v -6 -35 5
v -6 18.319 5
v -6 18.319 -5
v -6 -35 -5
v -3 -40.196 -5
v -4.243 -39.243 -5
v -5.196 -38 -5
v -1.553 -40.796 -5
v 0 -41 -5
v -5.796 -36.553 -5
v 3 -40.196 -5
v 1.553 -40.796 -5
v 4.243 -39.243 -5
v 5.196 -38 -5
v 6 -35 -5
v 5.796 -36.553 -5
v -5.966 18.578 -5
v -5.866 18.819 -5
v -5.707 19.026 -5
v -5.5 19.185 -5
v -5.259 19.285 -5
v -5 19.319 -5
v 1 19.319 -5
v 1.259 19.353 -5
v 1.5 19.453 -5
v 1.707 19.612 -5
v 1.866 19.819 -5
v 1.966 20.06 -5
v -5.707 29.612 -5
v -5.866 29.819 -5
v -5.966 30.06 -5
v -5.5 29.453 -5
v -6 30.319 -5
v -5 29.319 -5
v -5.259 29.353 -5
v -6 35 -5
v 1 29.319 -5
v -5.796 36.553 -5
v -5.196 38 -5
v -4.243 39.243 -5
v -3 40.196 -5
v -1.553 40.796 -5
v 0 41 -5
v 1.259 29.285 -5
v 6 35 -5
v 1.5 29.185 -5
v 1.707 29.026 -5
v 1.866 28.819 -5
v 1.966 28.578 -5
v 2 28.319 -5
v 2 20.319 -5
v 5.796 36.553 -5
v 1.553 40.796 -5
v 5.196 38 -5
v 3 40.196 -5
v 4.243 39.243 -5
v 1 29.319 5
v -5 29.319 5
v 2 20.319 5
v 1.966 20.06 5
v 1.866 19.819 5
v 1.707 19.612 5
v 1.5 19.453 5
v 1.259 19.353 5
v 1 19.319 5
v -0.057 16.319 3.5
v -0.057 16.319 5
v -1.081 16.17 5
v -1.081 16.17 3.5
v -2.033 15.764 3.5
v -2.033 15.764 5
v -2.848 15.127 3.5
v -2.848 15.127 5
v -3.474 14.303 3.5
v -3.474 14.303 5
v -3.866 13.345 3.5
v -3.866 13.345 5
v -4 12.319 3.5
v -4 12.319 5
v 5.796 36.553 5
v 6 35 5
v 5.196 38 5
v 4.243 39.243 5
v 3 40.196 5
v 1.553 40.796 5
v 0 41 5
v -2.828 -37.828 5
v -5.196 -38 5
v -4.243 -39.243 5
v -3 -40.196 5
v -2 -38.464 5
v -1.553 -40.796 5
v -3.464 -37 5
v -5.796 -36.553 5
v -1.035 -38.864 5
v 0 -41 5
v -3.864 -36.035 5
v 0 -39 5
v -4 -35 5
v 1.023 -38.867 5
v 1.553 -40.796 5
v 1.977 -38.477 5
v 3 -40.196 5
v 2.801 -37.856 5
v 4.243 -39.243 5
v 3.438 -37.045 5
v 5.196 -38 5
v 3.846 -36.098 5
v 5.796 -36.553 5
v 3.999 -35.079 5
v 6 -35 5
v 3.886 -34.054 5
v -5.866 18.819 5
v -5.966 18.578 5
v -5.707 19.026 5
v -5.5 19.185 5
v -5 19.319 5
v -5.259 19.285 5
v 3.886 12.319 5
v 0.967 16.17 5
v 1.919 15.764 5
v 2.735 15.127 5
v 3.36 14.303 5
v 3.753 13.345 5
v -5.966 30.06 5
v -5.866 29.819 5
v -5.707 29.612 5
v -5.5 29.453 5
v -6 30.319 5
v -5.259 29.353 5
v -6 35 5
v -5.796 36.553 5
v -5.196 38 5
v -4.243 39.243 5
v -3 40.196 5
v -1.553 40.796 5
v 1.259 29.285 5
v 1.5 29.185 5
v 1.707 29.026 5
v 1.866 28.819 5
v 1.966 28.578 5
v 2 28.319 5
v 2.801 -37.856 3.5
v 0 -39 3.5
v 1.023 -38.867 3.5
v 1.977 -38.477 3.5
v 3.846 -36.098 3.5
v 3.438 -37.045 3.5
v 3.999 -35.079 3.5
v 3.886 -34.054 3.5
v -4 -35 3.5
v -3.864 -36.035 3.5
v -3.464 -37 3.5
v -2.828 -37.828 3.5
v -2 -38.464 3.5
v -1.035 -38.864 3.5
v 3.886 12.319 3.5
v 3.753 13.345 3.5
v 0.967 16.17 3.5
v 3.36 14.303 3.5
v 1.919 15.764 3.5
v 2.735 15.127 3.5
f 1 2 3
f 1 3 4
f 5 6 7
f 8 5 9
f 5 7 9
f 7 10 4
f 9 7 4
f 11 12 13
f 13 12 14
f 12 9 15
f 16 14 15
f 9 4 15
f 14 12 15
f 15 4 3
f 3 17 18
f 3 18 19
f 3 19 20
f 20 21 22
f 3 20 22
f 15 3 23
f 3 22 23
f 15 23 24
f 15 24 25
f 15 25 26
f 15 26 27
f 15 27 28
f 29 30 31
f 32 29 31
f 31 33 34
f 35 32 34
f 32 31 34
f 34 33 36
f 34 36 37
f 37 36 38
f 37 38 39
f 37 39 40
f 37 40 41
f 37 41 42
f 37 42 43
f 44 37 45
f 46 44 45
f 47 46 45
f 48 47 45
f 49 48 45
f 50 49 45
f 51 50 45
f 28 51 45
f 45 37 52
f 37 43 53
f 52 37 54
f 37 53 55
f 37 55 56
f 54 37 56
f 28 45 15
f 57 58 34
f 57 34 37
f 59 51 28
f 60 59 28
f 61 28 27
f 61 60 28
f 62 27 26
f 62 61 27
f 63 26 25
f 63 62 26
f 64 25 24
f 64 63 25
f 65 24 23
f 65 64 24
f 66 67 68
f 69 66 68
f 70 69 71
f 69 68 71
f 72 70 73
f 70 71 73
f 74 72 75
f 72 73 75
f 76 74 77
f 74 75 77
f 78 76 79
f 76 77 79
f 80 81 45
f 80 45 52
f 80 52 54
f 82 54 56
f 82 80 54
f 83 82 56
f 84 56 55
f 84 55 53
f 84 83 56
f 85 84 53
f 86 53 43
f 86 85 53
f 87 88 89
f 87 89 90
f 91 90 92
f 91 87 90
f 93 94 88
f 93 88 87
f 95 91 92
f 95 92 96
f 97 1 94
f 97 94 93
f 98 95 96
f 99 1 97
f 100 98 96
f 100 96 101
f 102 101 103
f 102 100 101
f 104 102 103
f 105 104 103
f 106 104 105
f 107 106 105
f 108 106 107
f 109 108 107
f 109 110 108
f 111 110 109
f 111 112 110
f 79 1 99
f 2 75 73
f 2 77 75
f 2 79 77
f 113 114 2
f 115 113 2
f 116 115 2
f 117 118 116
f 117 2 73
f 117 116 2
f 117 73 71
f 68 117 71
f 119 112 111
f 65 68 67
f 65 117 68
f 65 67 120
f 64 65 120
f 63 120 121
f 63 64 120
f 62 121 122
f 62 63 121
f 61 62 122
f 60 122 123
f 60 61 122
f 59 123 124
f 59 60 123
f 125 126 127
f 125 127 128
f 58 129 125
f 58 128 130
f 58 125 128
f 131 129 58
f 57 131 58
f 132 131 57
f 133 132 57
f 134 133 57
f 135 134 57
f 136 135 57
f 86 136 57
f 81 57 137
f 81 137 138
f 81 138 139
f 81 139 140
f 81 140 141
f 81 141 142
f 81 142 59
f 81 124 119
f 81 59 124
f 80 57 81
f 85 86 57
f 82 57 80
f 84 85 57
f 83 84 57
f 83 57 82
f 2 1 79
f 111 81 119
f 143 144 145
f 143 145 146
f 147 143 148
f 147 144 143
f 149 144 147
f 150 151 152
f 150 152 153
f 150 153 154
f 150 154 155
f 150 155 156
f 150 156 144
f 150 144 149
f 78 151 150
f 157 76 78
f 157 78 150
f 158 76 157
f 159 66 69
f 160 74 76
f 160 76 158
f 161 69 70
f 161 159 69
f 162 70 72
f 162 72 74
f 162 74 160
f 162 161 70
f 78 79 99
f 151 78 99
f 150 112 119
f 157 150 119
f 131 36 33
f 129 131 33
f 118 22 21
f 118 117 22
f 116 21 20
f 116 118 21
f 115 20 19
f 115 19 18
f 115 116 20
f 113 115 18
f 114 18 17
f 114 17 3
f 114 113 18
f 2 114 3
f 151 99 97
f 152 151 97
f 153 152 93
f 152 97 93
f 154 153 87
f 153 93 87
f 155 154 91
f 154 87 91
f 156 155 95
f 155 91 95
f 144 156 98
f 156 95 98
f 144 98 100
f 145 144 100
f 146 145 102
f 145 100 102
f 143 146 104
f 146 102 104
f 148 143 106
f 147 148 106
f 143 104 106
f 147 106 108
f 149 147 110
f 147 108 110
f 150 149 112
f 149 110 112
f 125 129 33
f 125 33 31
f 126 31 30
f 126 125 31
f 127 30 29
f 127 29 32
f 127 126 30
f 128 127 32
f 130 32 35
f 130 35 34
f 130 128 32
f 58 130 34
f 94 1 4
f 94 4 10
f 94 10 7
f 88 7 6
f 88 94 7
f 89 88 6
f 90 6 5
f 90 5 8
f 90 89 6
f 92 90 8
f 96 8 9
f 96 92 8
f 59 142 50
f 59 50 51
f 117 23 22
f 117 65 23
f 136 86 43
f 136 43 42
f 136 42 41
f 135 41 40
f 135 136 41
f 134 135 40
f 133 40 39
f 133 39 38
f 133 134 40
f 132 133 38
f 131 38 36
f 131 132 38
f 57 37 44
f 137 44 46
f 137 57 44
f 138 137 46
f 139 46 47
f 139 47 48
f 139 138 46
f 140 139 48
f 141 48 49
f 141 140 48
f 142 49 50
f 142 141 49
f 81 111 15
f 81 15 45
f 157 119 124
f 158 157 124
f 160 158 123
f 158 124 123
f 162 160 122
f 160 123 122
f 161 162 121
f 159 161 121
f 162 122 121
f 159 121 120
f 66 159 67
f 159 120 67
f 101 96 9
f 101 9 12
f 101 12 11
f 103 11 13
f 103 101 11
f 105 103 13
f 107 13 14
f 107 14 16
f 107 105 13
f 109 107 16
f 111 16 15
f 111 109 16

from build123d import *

# Parameters (mm, degrees)
F1_DEPTH = 5
F3_DEPTH = 1.5


with BuildPart() as f1:
    # F0 (on Top) → F1 (new body, symmetric)
    with BuildSketch(Plane.XY):
        with BuildLine():
            ThreePointArc((-5, 19.319071), (-5.707107, 19.026177), (-6, 18.319071))
            Line((-6, 18.319071), (-6, -35))
            ThreePointArc((-6, -35), (-4.242641, -39.242641), (0, -41))
            ThreePointArc((0, -41), (4.242641, -39.242641), (6, -35))
            Line((6, -35), (6, 35))
            ThreePointArc((6, 35), (4.242641, 39.242641), (0, 41))
            ThreePointArc((0, 41), (-4.242641, 39.242641), (-6, 35))
            Line((-6, 35), (-6, 30.319071))
            ThreePointArc((-6, 30.319071), (-5.707107, 29.611964), (-5, 29.319071))
            Line((-5, 29.319071), (1, 29.319071))
            ThreePointArc((1, 29.319071), (1.707107, 29.026177), (2, 28.319071))
            Line((2, 28.319071), (2, 20.319071))
            ThreePointArc((2, 20.319071), (1.707107, 19.611964), (1, 19.319071))
            Line((1, 19.319071), (-5, 19.319071))
        make_face()
    extrude(amount=F1_DEPTH, both=True)

    # F2 (on face) → F3 (cut, symmetric)
    with BuildSketch(Plane.XY.offset(5)):
        with BuildLine():
            Line((-4, 12.319071), (-4, -35))
            ThreePointArc((-4, -35), (-2.828427, -37.828427), (0, -39))
            ThreePointArc((0, -39), (3.145296, -37.471258), (3.886418, -34.053558))
            Line((3.886418, -34.053558), (3.886418, 12.319071))
            ThreePointArc((3.886418, 12.319071), (2.734853, 15.127347), (-0.056791, 16.318667))
            ThreePointArc((-0.056791, 16.318667), (-2.848435, 15.127347), (-4, 12.319071))
        make_face()
    extrude(amount=F3_DEPTH, both=True, mode=Mode.SUBTRACT)


solid = f1.part
